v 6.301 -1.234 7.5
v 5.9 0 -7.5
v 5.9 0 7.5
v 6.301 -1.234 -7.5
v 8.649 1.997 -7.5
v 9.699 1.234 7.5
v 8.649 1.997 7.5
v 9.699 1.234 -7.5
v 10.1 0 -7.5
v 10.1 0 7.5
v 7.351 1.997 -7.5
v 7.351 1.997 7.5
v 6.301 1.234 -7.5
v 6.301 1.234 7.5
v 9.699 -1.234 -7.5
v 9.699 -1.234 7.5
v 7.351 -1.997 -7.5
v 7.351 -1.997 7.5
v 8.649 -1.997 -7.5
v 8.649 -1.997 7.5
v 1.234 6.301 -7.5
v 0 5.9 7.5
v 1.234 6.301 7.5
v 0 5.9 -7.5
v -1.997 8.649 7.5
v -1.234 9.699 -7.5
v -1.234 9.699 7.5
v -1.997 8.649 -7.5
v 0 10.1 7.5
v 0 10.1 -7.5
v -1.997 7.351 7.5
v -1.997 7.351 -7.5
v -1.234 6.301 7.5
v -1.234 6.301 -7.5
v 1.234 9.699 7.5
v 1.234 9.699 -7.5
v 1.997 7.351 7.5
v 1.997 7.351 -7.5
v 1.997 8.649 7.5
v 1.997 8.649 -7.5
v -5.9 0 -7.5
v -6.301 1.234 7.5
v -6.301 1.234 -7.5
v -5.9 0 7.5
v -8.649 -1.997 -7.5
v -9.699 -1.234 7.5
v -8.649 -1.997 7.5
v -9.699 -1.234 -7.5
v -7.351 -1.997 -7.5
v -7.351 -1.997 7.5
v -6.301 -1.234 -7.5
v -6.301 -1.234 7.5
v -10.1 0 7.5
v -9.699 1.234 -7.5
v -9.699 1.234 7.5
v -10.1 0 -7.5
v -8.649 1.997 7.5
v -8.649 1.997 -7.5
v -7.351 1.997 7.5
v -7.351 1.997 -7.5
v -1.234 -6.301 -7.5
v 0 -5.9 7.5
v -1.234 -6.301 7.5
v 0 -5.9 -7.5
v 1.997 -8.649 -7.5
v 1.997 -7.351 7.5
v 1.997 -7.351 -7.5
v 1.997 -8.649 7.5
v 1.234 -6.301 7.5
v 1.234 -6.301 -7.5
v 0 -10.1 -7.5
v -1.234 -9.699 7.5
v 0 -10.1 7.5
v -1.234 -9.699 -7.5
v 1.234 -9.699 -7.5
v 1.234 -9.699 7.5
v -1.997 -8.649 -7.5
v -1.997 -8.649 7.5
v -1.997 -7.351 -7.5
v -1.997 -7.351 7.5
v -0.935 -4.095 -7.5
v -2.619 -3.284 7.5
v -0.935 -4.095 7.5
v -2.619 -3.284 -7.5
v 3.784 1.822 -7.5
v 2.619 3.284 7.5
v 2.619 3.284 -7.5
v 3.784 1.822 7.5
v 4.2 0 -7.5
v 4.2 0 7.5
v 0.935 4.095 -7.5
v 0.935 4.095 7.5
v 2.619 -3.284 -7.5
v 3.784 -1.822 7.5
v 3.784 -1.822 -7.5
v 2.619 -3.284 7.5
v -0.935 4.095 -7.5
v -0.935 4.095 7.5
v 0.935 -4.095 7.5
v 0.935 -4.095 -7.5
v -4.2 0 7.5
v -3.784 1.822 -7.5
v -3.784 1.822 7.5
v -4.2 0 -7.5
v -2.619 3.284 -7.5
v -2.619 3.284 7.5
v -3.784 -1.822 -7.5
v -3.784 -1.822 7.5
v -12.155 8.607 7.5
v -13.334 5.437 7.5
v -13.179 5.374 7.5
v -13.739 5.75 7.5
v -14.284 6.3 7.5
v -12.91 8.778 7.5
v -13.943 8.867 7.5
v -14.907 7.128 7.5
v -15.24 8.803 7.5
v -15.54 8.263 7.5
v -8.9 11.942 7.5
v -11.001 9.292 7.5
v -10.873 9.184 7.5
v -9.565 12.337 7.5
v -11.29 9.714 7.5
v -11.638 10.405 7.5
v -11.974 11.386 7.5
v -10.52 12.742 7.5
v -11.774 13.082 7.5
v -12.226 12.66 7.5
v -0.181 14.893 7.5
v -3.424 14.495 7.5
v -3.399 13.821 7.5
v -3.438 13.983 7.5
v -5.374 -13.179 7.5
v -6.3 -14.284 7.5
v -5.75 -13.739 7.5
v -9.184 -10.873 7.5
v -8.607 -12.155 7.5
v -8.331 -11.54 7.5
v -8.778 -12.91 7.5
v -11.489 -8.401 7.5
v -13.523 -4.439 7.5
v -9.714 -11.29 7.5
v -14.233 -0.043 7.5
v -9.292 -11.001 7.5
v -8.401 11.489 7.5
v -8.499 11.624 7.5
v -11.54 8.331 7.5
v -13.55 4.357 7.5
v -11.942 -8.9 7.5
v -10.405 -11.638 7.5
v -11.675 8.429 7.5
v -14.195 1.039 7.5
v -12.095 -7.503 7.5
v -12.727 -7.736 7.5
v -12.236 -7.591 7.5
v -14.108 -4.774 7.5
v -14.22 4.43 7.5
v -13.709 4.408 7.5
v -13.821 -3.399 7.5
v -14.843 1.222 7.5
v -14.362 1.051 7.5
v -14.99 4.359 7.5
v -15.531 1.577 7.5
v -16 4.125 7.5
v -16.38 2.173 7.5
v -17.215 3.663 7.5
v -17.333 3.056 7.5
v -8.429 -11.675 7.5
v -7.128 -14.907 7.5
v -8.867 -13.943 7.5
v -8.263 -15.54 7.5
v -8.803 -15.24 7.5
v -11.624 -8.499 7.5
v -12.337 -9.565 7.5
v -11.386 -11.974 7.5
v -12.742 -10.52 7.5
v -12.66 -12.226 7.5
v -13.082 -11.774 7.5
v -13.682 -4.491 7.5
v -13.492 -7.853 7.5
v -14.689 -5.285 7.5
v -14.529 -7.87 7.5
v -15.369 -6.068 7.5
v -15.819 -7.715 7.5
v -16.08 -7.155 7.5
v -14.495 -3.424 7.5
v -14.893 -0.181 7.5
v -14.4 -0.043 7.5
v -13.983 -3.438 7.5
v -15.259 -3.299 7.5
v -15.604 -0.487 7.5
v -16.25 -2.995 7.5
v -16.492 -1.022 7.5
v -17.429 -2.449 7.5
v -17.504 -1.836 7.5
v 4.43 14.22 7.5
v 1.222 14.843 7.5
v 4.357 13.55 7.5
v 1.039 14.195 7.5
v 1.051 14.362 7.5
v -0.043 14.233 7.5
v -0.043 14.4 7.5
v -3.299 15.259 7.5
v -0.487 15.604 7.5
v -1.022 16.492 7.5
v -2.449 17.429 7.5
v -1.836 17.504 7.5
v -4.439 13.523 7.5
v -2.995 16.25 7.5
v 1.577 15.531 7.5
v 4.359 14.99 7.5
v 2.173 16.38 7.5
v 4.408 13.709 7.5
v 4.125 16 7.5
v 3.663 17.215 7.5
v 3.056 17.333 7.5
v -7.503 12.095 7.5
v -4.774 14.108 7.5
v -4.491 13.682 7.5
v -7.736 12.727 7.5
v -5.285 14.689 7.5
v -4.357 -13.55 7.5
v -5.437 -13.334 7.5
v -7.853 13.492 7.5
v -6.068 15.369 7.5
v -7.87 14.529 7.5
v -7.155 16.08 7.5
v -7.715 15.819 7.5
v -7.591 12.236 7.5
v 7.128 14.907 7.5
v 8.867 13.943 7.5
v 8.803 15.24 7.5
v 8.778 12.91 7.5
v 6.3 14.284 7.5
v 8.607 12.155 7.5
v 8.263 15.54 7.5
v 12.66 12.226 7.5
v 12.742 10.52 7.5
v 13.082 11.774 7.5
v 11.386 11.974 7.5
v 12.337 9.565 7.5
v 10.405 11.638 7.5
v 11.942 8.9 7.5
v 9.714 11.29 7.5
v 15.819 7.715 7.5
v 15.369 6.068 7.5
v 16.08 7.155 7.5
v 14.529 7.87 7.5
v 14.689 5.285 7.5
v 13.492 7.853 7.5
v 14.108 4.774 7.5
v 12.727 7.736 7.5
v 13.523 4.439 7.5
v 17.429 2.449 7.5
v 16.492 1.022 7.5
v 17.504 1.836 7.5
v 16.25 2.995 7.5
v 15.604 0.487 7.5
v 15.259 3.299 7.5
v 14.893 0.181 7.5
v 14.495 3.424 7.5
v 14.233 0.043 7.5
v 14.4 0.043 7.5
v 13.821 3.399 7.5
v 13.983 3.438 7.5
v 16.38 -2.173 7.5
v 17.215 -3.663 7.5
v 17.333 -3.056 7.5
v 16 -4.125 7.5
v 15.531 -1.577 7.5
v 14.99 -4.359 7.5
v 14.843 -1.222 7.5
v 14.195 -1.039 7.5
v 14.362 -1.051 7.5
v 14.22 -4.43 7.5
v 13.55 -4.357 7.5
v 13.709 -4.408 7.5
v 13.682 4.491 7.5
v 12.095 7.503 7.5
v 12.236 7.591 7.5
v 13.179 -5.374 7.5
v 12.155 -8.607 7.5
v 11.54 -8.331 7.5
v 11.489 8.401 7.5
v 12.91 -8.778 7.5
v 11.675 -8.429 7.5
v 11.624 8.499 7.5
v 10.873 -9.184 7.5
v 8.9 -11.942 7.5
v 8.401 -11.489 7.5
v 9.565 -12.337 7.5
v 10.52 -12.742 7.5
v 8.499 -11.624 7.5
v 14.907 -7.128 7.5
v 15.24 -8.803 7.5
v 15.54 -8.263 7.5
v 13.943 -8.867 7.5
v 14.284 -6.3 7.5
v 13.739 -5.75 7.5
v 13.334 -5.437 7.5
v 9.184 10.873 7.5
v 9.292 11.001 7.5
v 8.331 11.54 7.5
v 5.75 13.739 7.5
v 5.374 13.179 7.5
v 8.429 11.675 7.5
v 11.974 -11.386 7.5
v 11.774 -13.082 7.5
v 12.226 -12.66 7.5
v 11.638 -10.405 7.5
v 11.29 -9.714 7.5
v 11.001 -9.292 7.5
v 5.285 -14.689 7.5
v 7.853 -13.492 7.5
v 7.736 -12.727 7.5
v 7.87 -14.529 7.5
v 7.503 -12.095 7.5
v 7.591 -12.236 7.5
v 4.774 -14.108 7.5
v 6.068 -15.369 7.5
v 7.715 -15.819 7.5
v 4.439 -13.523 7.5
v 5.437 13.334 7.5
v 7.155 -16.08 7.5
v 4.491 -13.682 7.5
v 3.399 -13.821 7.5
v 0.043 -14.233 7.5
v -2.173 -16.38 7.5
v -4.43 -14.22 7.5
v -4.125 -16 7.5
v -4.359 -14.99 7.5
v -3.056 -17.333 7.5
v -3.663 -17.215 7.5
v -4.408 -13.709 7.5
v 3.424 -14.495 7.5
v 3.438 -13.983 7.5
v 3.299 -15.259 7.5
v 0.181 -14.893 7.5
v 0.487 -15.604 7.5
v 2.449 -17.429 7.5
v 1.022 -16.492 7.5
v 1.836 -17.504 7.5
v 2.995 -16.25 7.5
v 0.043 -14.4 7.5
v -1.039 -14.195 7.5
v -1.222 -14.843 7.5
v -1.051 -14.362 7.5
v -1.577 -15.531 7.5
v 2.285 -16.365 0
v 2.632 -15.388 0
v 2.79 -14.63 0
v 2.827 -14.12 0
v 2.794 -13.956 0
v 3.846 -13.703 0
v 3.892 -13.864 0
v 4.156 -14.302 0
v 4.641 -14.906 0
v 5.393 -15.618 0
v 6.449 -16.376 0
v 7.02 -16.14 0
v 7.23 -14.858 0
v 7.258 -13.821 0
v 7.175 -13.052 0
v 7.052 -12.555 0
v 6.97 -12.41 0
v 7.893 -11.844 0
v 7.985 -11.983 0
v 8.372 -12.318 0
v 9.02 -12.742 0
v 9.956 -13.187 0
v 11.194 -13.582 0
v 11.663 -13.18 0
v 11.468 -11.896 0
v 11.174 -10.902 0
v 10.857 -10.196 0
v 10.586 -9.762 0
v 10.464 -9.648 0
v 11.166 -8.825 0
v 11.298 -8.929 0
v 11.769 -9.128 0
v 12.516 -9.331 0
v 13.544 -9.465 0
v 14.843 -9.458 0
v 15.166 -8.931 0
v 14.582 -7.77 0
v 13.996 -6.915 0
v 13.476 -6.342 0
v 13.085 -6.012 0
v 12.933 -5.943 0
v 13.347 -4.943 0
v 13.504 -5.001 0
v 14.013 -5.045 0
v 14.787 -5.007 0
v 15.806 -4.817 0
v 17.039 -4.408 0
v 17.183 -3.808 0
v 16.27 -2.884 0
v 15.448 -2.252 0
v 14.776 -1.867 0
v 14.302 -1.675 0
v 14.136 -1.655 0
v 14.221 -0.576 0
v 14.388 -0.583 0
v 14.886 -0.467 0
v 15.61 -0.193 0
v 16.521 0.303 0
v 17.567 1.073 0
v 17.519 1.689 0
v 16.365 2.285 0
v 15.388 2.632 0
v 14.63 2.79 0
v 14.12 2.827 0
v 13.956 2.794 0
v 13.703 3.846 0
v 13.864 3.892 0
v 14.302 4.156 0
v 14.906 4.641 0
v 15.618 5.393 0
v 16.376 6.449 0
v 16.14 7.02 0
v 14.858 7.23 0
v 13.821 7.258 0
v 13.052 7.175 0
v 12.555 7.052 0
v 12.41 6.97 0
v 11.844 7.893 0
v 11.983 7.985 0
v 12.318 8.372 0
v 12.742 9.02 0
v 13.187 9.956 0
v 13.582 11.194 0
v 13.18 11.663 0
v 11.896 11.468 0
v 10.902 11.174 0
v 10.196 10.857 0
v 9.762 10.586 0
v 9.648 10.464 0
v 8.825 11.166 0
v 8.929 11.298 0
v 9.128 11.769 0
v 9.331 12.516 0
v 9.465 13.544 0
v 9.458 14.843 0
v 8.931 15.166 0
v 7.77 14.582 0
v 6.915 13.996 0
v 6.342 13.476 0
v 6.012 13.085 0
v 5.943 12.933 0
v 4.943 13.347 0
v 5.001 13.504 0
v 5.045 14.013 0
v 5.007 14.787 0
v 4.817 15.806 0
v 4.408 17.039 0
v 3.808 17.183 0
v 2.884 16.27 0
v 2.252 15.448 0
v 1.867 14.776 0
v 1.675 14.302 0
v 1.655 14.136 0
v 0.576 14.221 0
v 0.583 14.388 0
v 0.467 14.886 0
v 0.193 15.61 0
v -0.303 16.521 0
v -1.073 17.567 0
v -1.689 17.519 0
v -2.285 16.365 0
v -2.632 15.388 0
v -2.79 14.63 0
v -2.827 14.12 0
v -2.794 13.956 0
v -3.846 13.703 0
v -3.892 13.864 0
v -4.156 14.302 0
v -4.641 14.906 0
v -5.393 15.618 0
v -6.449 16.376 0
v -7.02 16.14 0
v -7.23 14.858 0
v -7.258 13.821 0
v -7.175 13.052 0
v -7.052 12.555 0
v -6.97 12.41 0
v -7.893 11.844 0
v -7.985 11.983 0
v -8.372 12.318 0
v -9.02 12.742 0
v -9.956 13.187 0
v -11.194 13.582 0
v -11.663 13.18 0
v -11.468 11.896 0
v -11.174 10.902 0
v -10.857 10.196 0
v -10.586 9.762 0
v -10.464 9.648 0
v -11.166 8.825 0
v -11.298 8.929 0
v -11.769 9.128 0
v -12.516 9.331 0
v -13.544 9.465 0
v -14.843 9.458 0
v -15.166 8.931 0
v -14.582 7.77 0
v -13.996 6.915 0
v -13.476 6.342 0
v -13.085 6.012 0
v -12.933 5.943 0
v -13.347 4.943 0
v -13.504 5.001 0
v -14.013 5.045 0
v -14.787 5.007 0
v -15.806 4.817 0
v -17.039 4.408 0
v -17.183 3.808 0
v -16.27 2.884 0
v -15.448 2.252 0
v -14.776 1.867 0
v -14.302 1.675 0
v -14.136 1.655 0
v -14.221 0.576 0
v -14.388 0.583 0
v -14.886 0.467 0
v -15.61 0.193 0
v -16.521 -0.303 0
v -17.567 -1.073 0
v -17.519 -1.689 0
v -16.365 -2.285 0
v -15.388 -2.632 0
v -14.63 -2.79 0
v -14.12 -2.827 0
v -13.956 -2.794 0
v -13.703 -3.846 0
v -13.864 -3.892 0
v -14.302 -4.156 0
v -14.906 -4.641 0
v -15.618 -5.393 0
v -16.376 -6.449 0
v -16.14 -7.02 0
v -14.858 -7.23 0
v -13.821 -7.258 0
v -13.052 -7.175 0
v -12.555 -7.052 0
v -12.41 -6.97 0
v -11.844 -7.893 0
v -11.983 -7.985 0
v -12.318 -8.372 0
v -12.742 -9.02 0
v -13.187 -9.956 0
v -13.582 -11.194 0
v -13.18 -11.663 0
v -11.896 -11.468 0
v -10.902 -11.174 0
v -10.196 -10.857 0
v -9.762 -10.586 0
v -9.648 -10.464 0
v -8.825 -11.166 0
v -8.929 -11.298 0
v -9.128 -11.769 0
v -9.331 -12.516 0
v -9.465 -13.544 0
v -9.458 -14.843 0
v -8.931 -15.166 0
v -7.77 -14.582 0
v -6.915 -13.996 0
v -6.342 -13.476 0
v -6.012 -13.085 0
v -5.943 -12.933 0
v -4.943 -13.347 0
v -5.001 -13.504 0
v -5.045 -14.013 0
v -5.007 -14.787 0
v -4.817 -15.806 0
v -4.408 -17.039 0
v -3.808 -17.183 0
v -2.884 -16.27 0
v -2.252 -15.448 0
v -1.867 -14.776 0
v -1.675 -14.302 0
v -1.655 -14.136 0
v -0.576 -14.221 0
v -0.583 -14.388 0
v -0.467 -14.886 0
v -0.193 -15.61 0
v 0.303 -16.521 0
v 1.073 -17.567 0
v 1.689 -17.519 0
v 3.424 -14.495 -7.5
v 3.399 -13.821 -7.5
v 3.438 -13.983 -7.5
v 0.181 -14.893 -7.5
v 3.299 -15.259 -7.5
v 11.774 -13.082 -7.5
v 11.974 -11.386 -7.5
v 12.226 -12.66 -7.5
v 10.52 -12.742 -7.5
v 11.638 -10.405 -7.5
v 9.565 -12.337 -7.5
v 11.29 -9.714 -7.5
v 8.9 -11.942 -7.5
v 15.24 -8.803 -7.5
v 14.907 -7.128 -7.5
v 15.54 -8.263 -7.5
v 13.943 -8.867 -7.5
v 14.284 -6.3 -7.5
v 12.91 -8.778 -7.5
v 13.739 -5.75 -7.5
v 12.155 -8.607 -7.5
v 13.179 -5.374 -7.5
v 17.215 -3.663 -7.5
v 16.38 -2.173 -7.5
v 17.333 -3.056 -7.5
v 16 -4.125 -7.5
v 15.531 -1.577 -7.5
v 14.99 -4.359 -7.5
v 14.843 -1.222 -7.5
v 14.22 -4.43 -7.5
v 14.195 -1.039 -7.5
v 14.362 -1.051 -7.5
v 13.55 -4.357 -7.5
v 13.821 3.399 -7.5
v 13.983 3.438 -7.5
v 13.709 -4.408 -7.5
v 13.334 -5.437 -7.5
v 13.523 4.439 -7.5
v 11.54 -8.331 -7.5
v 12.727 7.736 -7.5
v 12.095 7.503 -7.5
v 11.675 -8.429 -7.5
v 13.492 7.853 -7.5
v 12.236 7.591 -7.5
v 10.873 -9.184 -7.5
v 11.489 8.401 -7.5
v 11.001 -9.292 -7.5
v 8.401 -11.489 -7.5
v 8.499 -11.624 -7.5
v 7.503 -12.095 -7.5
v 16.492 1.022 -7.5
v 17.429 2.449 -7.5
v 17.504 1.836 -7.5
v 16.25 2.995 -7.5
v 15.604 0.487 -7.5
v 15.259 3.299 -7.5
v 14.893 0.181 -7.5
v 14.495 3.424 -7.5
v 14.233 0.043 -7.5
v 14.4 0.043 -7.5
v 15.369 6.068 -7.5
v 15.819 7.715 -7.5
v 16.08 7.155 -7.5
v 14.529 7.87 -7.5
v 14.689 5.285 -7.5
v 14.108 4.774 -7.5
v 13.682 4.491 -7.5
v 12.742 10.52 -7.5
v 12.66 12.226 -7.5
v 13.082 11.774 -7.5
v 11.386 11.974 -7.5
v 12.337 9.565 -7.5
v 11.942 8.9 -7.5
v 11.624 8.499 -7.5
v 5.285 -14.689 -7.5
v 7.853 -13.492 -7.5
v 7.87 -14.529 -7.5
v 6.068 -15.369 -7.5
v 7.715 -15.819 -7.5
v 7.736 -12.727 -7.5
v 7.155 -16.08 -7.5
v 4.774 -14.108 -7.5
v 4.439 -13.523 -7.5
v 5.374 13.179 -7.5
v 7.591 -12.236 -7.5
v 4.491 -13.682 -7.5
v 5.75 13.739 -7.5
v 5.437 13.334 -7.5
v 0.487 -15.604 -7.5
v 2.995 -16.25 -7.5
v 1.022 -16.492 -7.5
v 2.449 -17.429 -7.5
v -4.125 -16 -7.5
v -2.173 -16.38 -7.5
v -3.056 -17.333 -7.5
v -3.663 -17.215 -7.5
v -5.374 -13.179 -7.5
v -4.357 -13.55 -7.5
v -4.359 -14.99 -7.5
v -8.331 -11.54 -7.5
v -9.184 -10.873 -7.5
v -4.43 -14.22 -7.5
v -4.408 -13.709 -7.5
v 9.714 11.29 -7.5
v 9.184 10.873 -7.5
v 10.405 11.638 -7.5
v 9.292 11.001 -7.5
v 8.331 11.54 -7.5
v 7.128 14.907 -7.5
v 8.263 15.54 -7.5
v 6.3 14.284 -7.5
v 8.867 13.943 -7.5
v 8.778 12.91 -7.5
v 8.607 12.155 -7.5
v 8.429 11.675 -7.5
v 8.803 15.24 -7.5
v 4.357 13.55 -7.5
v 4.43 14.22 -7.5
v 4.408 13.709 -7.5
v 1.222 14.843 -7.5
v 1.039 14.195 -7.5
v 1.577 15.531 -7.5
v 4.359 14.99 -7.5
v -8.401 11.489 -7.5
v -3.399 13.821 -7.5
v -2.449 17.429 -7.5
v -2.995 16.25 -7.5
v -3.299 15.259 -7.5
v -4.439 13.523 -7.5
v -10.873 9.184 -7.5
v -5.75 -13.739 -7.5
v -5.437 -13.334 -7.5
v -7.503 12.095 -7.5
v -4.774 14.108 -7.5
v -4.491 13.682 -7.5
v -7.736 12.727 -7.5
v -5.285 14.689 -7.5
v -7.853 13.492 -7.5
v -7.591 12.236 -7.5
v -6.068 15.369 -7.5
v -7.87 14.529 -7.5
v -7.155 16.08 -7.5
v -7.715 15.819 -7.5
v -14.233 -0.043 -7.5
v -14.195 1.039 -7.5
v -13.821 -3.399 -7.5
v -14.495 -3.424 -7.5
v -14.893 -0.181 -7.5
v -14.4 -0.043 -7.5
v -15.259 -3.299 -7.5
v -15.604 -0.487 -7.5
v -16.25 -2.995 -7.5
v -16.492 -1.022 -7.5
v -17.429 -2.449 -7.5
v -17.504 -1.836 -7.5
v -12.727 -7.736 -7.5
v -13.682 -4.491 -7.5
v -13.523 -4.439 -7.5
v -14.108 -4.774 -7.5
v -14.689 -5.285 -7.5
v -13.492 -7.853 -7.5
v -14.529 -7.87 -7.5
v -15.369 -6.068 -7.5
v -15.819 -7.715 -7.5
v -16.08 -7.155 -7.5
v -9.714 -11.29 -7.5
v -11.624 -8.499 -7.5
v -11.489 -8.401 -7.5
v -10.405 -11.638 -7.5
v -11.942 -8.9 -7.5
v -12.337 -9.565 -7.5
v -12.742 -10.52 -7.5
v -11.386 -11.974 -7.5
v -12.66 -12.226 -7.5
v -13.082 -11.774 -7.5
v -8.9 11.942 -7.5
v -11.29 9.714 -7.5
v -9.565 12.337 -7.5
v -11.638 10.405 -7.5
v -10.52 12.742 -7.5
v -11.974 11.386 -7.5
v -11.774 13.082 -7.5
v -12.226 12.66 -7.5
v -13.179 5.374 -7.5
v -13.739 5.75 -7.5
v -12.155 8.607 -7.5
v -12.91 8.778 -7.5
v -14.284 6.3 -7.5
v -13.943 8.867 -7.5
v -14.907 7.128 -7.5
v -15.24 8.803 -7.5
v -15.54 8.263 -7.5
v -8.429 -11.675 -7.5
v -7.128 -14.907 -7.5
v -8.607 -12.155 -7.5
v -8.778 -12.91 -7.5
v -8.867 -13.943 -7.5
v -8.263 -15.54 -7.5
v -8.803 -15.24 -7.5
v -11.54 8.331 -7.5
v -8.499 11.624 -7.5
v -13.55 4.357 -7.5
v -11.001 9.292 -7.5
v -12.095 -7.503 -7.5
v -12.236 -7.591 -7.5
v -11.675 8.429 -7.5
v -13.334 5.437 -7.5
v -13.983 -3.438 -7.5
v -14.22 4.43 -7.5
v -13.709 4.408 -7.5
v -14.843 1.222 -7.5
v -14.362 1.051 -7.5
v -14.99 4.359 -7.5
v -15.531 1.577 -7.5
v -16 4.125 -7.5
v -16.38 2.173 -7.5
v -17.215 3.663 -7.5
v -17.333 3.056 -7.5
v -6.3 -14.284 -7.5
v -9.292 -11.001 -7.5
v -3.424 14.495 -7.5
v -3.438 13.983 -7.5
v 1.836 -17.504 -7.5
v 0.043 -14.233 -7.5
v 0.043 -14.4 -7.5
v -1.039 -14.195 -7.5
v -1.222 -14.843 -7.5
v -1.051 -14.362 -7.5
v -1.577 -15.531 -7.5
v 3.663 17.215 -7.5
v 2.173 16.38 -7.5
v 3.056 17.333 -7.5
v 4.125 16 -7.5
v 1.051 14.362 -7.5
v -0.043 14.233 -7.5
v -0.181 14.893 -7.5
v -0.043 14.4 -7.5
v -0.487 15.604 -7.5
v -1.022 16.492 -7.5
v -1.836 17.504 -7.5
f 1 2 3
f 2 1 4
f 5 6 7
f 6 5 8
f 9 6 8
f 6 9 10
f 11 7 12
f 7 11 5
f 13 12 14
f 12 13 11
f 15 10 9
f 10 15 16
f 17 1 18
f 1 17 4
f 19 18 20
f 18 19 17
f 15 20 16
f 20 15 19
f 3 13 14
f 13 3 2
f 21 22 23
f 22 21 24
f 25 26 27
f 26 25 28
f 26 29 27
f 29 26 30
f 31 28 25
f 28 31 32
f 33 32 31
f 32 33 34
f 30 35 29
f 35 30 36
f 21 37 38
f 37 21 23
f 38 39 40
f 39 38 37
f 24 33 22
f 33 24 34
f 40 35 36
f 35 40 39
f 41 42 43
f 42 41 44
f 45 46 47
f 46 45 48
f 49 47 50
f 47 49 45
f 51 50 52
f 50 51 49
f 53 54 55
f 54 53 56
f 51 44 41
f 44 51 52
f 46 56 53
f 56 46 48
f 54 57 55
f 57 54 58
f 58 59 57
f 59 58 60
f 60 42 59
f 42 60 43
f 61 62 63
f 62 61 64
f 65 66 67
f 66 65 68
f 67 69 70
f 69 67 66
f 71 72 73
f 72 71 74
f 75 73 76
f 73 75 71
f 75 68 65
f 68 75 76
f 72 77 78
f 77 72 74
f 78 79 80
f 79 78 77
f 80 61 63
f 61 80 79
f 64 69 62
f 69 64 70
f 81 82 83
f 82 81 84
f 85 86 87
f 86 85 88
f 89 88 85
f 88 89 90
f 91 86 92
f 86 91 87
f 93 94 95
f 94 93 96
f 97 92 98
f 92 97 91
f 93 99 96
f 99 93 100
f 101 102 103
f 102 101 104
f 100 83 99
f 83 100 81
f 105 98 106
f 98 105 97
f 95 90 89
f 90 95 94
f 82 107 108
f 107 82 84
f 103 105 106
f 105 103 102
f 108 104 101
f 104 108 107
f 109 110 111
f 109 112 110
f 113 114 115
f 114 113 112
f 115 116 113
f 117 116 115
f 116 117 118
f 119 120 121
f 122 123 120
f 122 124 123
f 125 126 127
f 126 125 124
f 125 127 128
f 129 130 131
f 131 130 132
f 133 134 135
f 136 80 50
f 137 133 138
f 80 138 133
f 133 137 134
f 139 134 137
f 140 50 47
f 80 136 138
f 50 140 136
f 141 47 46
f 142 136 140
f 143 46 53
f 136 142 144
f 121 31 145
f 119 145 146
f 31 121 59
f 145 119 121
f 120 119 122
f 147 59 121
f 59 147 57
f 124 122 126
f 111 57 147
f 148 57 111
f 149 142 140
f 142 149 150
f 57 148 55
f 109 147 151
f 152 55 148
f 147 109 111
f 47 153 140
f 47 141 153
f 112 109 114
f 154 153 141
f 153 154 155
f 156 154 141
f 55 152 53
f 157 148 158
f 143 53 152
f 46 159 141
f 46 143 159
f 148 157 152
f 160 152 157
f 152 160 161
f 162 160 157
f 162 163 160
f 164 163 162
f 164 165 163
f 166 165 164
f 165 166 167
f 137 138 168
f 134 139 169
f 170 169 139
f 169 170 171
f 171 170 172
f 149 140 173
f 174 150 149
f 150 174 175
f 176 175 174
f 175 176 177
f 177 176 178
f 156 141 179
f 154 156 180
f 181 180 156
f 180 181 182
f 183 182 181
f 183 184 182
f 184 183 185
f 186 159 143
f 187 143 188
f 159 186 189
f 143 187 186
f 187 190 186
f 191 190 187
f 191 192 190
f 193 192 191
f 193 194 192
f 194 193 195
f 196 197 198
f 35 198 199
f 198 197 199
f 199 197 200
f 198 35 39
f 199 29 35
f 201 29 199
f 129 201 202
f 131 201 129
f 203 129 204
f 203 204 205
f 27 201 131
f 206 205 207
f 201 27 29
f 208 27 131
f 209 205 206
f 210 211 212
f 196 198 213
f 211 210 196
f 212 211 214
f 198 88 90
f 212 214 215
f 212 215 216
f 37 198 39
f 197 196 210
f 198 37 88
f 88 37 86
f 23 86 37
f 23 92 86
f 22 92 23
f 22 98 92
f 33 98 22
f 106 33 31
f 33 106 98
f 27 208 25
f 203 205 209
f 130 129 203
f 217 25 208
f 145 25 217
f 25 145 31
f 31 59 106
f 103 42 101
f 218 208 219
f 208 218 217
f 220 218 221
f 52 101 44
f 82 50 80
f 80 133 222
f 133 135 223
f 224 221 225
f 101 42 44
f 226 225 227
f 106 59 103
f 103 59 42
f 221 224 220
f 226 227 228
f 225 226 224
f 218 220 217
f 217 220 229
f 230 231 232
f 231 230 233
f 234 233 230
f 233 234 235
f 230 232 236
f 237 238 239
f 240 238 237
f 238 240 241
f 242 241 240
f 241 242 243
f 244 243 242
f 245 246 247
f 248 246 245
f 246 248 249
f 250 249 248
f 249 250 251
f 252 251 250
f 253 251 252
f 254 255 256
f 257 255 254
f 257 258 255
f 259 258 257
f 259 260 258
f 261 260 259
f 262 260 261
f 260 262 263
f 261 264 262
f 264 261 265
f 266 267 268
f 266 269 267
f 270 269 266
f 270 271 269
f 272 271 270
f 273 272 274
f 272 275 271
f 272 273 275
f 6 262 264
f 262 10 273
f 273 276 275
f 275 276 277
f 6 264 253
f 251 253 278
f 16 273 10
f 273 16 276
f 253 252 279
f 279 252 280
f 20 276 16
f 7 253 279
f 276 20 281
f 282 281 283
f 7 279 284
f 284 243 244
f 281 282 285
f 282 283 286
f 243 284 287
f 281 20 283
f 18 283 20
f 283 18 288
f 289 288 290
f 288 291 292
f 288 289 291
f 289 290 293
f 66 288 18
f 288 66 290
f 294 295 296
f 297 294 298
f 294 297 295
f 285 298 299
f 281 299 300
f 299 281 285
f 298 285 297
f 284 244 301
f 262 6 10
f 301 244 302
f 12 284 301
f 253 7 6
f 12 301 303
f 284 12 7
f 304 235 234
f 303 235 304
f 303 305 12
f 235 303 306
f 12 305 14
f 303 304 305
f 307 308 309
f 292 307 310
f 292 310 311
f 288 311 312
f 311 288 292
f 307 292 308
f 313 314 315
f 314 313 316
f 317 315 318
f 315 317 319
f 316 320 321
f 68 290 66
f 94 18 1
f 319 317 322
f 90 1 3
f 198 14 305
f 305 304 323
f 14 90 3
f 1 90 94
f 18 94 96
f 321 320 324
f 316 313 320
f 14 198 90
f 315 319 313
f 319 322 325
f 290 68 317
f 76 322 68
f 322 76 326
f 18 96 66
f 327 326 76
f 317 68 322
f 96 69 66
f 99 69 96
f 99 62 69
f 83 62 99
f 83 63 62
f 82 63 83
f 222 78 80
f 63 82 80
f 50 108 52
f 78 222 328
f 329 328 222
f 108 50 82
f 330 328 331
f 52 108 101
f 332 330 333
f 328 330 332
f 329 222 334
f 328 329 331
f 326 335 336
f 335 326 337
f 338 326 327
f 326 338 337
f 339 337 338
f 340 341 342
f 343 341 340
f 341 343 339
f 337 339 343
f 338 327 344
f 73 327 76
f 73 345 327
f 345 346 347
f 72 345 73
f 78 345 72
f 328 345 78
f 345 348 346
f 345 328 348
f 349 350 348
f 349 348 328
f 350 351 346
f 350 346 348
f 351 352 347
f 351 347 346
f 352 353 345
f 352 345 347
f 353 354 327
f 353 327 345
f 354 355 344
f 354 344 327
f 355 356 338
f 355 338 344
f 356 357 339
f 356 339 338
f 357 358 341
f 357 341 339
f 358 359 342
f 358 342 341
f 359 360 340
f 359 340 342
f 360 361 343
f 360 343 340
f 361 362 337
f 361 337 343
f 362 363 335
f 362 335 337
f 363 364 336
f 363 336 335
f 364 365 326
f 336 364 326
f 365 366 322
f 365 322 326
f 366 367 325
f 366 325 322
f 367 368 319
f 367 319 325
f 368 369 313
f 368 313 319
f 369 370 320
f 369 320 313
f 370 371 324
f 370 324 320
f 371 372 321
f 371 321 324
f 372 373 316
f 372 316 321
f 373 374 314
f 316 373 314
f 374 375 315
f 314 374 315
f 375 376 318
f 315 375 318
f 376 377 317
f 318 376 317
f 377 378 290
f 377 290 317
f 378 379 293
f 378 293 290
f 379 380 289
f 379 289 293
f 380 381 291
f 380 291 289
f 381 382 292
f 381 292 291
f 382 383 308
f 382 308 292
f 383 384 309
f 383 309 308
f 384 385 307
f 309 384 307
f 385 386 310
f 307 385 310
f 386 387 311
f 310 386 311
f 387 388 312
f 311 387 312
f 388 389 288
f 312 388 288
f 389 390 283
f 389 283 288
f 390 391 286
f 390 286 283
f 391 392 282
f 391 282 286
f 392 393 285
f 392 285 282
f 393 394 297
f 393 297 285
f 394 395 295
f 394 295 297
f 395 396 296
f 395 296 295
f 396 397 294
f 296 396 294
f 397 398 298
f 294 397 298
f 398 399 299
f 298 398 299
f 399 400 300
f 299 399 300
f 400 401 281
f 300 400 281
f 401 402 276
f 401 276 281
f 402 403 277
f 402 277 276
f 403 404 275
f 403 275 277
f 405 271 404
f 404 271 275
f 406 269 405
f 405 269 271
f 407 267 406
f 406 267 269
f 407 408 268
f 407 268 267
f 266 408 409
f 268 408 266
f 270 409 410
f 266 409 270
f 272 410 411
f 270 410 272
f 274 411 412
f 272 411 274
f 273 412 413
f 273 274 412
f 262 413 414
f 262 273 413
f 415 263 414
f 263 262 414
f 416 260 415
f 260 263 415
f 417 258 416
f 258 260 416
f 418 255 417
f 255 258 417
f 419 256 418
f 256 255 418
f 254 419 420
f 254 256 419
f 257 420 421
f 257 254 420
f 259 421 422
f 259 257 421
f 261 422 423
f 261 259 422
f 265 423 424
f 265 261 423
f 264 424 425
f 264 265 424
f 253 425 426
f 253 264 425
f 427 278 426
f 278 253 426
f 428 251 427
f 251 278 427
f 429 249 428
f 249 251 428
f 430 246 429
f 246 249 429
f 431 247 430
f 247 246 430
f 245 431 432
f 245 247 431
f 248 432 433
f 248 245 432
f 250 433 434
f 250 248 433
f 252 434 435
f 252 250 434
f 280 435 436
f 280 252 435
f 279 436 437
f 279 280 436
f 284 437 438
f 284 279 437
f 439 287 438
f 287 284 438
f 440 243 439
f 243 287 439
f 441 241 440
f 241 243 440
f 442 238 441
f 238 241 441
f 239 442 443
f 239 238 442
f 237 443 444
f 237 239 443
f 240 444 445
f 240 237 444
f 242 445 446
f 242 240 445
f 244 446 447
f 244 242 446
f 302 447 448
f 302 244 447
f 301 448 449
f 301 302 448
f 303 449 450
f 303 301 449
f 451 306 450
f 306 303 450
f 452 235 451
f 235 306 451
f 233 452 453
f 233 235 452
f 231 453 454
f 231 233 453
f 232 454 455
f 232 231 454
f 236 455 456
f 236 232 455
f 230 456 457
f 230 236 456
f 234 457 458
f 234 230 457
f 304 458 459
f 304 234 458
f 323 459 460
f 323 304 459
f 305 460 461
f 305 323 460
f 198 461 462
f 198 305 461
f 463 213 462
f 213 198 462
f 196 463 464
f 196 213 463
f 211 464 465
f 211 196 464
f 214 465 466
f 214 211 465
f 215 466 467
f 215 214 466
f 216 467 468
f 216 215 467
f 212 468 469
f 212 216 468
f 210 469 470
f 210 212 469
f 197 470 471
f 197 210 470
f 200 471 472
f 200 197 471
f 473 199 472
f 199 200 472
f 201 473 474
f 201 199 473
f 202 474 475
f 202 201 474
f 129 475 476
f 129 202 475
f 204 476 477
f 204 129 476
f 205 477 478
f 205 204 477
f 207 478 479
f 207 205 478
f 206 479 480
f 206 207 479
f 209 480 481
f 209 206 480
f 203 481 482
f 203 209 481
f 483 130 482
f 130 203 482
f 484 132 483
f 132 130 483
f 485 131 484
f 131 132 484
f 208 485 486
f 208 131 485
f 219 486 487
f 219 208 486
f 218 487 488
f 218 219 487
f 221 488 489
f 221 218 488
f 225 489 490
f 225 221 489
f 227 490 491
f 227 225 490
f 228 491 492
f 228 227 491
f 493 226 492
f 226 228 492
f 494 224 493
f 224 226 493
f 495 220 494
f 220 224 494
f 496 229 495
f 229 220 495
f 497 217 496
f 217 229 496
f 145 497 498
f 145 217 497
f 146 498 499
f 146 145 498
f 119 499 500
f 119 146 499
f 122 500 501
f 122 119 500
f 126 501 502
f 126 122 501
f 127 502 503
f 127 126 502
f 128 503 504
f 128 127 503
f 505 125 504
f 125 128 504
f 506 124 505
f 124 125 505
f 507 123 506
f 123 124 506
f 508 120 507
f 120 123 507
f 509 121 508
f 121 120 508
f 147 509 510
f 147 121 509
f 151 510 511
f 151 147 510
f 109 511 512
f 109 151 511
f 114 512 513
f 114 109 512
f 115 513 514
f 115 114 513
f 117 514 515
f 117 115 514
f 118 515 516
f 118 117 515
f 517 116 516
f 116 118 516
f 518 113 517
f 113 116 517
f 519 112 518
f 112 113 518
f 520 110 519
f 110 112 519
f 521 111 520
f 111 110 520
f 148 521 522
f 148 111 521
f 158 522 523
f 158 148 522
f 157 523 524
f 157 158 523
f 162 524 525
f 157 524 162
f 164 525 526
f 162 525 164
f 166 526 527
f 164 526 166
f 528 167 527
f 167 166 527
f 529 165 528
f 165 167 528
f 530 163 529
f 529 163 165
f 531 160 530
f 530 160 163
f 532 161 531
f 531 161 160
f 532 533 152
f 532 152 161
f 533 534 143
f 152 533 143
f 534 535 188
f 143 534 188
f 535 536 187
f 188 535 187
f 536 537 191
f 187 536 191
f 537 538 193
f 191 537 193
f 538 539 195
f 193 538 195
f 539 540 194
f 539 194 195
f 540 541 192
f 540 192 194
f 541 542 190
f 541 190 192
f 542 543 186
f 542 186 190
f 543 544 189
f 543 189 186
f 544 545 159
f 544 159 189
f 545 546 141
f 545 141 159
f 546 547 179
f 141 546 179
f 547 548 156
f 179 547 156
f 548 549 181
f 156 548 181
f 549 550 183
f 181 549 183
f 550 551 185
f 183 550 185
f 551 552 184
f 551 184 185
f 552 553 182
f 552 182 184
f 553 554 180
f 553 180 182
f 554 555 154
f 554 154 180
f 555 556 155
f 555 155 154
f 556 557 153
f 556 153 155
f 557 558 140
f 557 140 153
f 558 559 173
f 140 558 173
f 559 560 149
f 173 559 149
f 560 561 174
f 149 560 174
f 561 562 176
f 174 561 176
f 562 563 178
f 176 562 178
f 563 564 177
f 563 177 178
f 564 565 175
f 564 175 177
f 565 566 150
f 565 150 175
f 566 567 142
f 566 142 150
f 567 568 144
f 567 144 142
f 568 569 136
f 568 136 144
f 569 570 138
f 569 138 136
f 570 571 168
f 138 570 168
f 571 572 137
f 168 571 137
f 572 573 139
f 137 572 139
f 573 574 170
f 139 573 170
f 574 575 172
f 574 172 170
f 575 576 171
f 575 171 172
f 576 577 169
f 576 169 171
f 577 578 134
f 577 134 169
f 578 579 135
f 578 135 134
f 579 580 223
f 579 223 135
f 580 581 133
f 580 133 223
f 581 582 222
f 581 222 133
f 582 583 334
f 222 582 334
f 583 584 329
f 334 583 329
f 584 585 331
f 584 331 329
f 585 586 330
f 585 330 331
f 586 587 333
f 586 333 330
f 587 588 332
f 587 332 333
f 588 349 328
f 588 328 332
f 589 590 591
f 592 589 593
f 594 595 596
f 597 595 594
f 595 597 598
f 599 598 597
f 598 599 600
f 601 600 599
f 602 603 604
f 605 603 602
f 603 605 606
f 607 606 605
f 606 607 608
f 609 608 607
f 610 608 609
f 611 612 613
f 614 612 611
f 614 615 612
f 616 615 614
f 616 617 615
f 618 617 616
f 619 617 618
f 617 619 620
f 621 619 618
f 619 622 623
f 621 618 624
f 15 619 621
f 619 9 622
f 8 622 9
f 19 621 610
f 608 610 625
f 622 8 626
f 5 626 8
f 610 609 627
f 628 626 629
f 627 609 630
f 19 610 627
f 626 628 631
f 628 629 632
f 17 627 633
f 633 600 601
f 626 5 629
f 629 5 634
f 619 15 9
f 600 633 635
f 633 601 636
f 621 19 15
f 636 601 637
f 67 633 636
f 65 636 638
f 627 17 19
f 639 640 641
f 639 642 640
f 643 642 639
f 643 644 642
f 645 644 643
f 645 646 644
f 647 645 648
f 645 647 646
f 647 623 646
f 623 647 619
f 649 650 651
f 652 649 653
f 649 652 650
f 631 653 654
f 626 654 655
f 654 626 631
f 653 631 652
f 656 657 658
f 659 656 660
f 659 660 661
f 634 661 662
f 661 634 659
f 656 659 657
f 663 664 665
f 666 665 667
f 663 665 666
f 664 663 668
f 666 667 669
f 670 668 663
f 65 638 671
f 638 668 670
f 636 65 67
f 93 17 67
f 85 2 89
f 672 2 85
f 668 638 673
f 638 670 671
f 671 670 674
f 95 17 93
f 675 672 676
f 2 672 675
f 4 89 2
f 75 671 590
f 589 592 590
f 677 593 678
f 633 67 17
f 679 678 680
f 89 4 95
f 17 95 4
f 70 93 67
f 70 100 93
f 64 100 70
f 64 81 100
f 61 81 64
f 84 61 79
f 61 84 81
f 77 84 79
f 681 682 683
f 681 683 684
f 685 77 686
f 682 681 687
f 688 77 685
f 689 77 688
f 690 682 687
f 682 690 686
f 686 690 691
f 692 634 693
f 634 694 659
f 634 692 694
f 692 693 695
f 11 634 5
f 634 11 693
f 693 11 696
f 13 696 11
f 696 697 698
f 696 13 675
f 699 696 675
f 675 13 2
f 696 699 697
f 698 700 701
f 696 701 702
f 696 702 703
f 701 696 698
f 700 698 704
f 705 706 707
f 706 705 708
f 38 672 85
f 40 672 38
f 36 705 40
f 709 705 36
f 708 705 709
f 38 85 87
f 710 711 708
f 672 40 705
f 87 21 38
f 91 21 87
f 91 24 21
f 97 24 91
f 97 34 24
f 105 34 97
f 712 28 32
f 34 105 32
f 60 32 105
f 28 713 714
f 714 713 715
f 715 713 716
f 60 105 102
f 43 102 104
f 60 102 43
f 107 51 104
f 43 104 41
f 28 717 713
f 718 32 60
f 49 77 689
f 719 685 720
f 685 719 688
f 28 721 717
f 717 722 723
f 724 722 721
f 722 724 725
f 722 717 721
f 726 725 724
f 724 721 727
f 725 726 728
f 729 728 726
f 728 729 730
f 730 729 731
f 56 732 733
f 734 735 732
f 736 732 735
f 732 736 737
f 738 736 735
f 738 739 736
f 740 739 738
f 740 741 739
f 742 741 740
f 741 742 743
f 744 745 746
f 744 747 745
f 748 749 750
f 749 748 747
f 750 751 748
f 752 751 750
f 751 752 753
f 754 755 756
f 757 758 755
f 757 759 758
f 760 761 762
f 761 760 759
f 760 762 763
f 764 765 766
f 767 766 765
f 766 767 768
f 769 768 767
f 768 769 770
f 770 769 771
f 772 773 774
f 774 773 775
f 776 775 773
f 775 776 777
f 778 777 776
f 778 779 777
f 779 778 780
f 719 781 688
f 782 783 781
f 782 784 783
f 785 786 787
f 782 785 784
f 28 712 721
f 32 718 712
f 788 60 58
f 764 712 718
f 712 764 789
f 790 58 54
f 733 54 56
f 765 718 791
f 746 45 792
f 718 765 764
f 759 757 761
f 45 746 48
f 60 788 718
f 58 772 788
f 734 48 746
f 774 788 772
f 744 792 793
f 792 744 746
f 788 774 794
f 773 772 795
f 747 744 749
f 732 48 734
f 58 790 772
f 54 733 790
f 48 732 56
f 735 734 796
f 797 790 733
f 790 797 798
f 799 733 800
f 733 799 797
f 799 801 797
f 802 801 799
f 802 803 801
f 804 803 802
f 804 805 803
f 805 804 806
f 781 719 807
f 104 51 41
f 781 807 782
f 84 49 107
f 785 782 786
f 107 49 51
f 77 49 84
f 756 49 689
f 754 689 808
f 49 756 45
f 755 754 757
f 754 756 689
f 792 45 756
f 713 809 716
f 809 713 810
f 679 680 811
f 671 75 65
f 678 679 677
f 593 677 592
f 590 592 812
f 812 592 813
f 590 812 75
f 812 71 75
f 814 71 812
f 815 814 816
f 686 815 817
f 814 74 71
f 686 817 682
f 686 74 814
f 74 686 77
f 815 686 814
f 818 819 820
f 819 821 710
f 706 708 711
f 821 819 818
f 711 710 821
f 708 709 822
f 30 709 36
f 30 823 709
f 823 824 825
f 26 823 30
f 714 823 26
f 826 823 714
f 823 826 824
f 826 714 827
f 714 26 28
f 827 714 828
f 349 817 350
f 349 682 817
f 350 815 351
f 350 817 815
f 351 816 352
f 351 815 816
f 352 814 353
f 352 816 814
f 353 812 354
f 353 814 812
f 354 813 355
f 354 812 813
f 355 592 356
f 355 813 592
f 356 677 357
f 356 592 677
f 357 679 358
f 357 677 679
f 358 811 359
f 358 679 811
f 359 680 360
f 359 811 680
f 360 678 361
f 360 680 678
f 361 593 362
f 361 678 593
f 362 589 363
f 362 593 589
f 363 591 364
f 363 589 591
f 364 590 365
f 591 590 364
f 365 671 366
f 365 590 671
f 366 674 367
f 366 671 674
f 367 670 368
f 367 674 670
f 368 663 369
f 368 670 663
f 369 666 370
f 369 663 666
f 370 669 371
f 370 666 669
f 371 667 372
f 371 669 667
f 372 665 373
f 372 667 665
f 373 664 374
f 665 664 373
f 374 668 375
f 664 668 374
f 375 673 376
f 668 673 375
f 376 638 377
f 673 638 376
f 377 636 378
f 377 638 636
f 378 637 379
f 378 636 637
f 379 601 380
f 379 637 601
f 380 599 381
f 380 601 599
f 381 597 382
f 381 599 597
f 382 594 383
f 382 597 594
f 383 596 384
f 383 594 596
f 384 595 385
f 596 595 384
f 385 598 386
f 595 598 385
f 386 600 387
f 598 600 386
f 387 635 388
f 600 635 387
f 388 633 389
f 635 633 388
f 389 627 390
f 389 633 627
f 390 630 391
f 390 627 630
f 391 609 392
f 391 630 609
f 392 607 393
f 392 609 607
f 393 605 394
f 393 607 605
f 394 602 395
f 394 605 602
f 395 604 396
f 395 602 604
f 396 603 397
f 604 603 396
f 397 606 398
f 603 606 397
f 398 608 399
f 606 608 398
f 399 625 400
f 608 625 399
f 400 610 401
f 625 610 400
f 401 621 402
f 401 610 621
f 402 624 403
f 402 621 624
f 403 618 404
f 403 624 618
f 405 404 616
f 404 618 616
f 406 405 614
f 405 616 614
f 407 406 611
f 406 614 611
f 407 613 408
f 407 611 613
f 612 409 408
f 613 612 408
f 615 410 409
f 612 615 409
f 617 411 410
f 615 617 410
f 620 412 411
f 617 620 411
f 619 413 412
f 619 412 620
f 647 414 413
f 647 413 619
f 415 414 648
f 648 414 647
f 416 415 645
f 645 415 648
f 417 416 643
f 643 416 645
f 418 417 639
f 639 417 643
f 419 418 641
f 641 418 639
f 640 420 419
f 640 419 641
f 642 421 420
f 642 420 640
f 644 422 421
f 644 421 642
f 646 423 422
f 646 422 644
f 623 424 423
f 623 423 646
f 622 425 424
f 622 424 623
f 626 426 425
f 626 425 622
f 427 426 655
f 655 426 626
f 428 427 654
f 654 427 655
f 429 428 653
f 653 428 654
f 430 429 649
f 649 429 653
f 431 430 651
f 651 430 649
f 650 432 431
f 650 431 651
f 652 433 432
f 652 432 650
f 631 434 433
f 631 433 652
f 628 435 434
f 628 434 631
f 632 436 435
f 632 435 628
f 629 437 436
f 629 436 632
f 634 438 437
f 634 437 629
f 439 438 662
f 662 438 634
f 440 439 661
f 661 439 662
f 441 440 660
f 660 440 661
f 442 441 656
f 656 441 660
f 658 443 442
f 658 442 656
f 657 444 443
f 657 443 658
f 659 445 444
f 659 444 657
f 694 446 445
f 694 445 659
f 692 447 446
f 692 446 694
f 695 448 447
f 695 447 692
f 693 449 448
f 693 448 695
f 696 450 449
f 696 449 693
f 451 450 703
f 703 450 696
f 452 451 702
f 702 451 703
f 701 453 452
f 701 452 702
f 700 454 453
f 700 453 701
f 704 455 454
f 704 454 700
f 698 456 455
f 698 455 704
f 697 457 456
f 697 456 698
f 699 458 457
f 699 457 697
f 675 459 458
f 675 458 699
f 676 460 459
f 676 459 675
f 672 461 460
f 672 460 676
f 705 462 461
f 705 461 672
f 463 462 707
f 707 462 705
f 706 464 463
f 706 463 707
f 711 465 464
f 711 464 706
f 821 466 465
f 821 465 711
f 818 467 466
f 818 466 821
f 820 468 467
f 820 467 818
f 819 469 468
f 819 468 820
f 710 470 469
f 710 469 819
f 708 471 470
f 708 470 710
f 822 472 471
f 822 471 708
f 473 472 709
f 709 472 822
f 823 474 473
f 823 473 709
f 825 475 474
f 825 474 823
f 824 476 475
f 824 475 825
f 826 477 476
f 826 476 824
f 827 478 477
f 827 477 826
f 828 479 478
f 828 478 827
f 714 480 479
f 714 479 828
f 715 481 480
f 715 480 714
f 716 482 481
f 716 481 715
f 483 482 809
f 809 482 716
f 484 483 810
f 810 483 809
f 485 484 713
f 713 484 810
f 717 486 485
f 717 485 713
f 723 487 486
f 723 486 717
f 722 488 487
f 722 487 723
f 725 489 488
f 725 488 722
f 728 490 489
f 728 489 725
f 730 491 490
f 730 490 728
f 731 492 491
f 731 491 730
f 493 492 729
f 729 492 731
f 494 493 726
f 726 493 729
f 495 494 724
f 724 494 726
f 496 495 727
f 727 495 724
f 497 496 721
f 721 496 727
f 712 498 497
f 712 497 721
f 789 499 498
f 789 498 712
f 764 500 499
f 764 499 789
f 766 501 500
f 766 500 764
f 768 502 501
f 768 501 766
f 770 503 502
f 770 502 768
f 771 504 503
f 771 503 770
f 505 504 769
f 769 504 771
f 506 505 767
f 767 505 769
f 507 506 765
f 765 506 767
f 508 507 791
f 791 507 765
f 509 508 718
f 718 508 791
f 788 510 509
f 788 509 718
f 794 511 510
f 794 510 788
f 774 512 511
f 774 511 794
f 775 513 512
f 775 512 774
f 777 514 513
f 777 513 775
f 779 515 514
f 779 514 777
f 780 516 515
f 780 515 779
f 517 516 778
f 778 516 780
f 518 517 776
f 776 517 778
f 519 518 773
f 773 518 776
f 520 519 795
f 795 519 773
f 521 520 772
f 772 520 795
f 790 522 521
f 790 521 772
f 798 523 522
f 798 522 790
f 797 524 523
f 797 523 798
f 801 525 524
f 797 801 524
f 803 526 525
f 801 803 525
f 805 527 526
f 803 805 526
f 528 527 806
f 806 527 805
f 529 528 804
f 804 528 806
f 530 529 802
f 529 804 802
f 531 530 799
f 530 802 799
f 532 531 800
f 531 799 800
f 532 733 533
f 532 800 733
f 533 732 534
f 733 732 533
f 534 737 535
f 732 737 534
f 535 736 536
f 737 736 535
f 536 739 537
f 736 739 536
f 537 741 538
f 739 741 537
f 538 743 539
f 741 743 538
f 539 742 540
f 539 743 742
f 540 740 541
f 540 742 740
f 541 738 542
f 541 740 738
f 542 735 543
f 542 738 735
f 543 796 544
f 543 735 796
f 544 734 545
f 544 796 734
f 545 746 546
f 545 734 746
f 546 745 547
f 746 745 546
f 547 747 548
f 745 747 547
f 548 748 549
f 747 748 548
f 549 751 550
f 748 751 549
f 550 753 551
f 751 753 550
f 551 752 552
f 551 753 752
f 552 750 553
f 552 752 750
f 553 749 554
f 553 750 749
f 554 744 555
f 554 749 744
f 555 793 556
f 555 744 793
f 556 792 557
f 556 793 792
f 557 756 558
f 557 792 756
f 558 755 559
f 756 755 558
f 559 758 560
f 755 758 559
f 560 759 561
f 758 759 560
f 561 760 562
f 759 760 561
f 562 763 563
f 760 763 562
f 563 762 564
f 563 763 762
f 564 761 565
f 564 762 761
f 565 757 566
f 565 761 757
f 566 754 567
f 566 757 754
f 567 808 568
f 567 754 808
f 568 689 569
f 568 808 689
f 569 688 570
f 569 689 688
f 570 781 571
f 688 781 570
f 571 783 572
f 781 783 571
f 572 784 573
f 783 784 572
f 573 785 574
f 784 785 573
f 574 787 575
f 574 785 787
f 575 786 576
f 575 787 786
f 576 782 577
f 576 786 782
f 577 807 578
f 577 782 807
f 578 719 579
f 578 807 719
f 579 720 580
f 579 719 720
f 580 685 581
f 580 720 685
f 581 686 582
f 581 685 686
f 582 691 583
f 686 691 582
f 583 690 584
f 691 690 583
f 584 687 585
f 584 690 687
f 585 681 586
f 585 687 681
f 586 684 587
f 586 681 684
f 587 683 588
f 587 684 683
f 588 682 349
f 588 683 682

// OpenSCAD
// Tetrix Gear Source.scad
// Daniel Teal 2014
//
// Generates a 3D model of a gear sized for Tetrix parts
//
// Usage: change the variable gear_teeth to one's preference, render the design by pressing F6 (it'll take a while), then export as an STL file.
//
// 20 teeth is equivalent to a small Tetrix gear (40T)
// 40 teeth is equivalent to a medium Tetrix gear (80T)

// Edit this:
gear_teeth = 20;

// Source code: leave alone unless you want to experiment.

/* TETRIX GEAR */

difference(){
	rotate(36/8)gear(pitch_radius=0.8*gear_teeth, teeth=gear_teeth, height=7.5, helix_angle=-30);
	translate([0,0,-1]){
		cylinder(r=4.2,h=10);
		for(i=[0:3]){
			rotate(i*90)translate([8,0,0])cylinder(r=2.1,h=10,$fn=10);
			rotate(i*90)translate([24,0,0])cylinder(r=2.1,h=10,$fn=10);
		}
	}
}
mirror([0,0,1])difference(){
	rotate(36/8)gear(pitch_radius=0.8*gear_teeth, teeth=gear_teeth, height=7.5, helix_angle=-30);
	translate([0,0,-1]){
		cylinder(r=4.2,h=10);
		for(i=[0:3]){
			rotate(i*90)translate([8,0,0])cylinder(r=2.1,h=10,$fn=10);
			rotate(i*90)translate([24,0,0])cylinder(r=2.1,h=10,$fn=10);
		}
	}
}

/* GEAR */
module gear(
		pitch_radius,
		teeth,
		height,
		pressure_angle=28,
		clearance=0,
		backlash=0,
		involute_facets=5,
		helix_angle=0,
		helix_segments=1){
// Properties
base_radius=pitch_radius*cos(pressure_angle);
addendum = 2*pitch_radius/teeth;
circular_pitch = pitch_radius*6.28318531/teeth;
outside_radius = pitch_radius + addendum;
dedendum = addendum+clearance;
root_radius = pitch_radius-dedendum;
// Calculations
min_t=base_radius<root_radius?angle(root_radius,base_radius):0;
max_t=angle(outside_radius,base_radius);
delta_t=(max_t-min_t)/(involute_facets-1);
half_circular_thickness_angle = 28.64788976/pitch_radius*(circular_pitch-backlash)*.5;
pitch_involute_point=involute(angle(pitch_radius,base_radius),base_radius);
offset=atan2(pitch_involute_point[1],pitch_involute_point[0]);
// Construction
linear_extrude(height=height,twist=tan(-helix_angle)*height*57.29577951/pitch_radius,slices=helix_segments,convexity=teeth){
	circle(r=root_radius,$fn=teeth);
	for(i=[0:involute_facets-2]){
		assign(point1=rotate(involute(min_t+i*delta_t,base_radius),-offset-half_circular_thickness_angle),
		point2=rotate(involute(min_t+(i+1)*delta_t,base_radius),-offset-half_circular_thickness_angle),
		delta_theta=360/teeth){
			for(theta=[0:teeth-1]){
				rotate(theta*delta_theta)
					polygon(points=[[0,0],point1,point2,mirror(point2),mirror(point1)],paths=[[0,1,2,3,4]]);
			}
		}
	}
}}

/* RACK GEAR */
module rack(
		mating_pitch_radius,
		mating_teeth,
		teeth,
		height,
		base_depth,
		pressure_angle=28,
		clearance=0,
		backlash=0,
		helix_angle=0){
// Properties
addendum=2*mating_pitch_radius/mating_teeth;
dedendum=addendum+clearance;
offset_a=tan(pressure_angle)*addendum;
offset_d=tan(pressure_angle)*dedendum;
half_tooth_width=mating_pitch_radius*1.57079633/mating_teeth;
helix_offset=tan(helix_angle)*height;
// Construct teeth
for(i=[0:teeth-1]){
	translate([i*half_tooth_width*4-half_tooth_width,0,0])
		polyhedron(points=[[-offset_d+backlash/4,-dedendum,0],[offset_a+backlash/4,addendum,0],[2*half_tooth_width-offset_a-backlash/4,addendum,0],[2*half_tooth_width+offset_d-backlash/4,-dedendum,0],[-offset_d+backlash/4+helix_offset,-dedendum,height],[offset_a+backlash/4+helix_offset,addendum,height],[2*half_tooth_width-offset_a-backlash/4+helix_offset,addendum,height],[2*half_tooth_width+offset_d-backlash/4+helix_offset,-dedendum,height]],triangles=[[0,1,2],[2,3,0],[4,5,6],[6,7,4],[0,1,4],[1,4,5],[1,2,5],[5,6,2],[2,3,6],[6,7,3],[0,3,4],[4,7,3]],convexity=1);
}
// Construct base
if(base_depth<dedendum){echo("ERROR: Rack base_depth too small.");}
x=-offset_d-half_tooth_width+backlash/4;
y=-base_depth;
x2=x+helix_offset;
width=half_tooth_width*4*(teeth-1)+half_tooth_width*2+2*offset_d-backlash/2;
length=base_depth-dedendum;
polyhedron(points=[[x,y,0],[x,y+length,0],[x+width,y+length,0],[x+width,y,0],[x2,y,height],[x2,y+length,height],[x2+width,y+length,height],[x2+width,y,height]],triangles=[[0,1,2],[2,3,0],[4,5,6],[6,7,4],[0,1,4],[1,4,5],[1,2,5],[5,6,2],[2,3,6],[6,7,3],[0,3,4],[4,7,3]]);
}

/* FUNCTIONS */
function toRadians(angle) = angle*0.01745329;
function toDegrees(angle) = angle*57.29577951;
function rotate(point,angle)=[point[0]*cos(angle)-point[1]*sin(angle), point[1]*cos(angle)+point[0]*sin(angle)];
function mirror(point)=[point[0],-point[1]];
// [x,y] for 't' on parametric involute with base radius 'b'
	function involute(t,b)=b*[cos(t)+toRadians(t)*sin(t),sin(t)-toRadians(t)*cos(t)];
// 't' for parametric involute with base radius 'b' at radius 'r'
	function angle(r,b)=toDegrees(sqrt(pow(r/b,2)-1));
